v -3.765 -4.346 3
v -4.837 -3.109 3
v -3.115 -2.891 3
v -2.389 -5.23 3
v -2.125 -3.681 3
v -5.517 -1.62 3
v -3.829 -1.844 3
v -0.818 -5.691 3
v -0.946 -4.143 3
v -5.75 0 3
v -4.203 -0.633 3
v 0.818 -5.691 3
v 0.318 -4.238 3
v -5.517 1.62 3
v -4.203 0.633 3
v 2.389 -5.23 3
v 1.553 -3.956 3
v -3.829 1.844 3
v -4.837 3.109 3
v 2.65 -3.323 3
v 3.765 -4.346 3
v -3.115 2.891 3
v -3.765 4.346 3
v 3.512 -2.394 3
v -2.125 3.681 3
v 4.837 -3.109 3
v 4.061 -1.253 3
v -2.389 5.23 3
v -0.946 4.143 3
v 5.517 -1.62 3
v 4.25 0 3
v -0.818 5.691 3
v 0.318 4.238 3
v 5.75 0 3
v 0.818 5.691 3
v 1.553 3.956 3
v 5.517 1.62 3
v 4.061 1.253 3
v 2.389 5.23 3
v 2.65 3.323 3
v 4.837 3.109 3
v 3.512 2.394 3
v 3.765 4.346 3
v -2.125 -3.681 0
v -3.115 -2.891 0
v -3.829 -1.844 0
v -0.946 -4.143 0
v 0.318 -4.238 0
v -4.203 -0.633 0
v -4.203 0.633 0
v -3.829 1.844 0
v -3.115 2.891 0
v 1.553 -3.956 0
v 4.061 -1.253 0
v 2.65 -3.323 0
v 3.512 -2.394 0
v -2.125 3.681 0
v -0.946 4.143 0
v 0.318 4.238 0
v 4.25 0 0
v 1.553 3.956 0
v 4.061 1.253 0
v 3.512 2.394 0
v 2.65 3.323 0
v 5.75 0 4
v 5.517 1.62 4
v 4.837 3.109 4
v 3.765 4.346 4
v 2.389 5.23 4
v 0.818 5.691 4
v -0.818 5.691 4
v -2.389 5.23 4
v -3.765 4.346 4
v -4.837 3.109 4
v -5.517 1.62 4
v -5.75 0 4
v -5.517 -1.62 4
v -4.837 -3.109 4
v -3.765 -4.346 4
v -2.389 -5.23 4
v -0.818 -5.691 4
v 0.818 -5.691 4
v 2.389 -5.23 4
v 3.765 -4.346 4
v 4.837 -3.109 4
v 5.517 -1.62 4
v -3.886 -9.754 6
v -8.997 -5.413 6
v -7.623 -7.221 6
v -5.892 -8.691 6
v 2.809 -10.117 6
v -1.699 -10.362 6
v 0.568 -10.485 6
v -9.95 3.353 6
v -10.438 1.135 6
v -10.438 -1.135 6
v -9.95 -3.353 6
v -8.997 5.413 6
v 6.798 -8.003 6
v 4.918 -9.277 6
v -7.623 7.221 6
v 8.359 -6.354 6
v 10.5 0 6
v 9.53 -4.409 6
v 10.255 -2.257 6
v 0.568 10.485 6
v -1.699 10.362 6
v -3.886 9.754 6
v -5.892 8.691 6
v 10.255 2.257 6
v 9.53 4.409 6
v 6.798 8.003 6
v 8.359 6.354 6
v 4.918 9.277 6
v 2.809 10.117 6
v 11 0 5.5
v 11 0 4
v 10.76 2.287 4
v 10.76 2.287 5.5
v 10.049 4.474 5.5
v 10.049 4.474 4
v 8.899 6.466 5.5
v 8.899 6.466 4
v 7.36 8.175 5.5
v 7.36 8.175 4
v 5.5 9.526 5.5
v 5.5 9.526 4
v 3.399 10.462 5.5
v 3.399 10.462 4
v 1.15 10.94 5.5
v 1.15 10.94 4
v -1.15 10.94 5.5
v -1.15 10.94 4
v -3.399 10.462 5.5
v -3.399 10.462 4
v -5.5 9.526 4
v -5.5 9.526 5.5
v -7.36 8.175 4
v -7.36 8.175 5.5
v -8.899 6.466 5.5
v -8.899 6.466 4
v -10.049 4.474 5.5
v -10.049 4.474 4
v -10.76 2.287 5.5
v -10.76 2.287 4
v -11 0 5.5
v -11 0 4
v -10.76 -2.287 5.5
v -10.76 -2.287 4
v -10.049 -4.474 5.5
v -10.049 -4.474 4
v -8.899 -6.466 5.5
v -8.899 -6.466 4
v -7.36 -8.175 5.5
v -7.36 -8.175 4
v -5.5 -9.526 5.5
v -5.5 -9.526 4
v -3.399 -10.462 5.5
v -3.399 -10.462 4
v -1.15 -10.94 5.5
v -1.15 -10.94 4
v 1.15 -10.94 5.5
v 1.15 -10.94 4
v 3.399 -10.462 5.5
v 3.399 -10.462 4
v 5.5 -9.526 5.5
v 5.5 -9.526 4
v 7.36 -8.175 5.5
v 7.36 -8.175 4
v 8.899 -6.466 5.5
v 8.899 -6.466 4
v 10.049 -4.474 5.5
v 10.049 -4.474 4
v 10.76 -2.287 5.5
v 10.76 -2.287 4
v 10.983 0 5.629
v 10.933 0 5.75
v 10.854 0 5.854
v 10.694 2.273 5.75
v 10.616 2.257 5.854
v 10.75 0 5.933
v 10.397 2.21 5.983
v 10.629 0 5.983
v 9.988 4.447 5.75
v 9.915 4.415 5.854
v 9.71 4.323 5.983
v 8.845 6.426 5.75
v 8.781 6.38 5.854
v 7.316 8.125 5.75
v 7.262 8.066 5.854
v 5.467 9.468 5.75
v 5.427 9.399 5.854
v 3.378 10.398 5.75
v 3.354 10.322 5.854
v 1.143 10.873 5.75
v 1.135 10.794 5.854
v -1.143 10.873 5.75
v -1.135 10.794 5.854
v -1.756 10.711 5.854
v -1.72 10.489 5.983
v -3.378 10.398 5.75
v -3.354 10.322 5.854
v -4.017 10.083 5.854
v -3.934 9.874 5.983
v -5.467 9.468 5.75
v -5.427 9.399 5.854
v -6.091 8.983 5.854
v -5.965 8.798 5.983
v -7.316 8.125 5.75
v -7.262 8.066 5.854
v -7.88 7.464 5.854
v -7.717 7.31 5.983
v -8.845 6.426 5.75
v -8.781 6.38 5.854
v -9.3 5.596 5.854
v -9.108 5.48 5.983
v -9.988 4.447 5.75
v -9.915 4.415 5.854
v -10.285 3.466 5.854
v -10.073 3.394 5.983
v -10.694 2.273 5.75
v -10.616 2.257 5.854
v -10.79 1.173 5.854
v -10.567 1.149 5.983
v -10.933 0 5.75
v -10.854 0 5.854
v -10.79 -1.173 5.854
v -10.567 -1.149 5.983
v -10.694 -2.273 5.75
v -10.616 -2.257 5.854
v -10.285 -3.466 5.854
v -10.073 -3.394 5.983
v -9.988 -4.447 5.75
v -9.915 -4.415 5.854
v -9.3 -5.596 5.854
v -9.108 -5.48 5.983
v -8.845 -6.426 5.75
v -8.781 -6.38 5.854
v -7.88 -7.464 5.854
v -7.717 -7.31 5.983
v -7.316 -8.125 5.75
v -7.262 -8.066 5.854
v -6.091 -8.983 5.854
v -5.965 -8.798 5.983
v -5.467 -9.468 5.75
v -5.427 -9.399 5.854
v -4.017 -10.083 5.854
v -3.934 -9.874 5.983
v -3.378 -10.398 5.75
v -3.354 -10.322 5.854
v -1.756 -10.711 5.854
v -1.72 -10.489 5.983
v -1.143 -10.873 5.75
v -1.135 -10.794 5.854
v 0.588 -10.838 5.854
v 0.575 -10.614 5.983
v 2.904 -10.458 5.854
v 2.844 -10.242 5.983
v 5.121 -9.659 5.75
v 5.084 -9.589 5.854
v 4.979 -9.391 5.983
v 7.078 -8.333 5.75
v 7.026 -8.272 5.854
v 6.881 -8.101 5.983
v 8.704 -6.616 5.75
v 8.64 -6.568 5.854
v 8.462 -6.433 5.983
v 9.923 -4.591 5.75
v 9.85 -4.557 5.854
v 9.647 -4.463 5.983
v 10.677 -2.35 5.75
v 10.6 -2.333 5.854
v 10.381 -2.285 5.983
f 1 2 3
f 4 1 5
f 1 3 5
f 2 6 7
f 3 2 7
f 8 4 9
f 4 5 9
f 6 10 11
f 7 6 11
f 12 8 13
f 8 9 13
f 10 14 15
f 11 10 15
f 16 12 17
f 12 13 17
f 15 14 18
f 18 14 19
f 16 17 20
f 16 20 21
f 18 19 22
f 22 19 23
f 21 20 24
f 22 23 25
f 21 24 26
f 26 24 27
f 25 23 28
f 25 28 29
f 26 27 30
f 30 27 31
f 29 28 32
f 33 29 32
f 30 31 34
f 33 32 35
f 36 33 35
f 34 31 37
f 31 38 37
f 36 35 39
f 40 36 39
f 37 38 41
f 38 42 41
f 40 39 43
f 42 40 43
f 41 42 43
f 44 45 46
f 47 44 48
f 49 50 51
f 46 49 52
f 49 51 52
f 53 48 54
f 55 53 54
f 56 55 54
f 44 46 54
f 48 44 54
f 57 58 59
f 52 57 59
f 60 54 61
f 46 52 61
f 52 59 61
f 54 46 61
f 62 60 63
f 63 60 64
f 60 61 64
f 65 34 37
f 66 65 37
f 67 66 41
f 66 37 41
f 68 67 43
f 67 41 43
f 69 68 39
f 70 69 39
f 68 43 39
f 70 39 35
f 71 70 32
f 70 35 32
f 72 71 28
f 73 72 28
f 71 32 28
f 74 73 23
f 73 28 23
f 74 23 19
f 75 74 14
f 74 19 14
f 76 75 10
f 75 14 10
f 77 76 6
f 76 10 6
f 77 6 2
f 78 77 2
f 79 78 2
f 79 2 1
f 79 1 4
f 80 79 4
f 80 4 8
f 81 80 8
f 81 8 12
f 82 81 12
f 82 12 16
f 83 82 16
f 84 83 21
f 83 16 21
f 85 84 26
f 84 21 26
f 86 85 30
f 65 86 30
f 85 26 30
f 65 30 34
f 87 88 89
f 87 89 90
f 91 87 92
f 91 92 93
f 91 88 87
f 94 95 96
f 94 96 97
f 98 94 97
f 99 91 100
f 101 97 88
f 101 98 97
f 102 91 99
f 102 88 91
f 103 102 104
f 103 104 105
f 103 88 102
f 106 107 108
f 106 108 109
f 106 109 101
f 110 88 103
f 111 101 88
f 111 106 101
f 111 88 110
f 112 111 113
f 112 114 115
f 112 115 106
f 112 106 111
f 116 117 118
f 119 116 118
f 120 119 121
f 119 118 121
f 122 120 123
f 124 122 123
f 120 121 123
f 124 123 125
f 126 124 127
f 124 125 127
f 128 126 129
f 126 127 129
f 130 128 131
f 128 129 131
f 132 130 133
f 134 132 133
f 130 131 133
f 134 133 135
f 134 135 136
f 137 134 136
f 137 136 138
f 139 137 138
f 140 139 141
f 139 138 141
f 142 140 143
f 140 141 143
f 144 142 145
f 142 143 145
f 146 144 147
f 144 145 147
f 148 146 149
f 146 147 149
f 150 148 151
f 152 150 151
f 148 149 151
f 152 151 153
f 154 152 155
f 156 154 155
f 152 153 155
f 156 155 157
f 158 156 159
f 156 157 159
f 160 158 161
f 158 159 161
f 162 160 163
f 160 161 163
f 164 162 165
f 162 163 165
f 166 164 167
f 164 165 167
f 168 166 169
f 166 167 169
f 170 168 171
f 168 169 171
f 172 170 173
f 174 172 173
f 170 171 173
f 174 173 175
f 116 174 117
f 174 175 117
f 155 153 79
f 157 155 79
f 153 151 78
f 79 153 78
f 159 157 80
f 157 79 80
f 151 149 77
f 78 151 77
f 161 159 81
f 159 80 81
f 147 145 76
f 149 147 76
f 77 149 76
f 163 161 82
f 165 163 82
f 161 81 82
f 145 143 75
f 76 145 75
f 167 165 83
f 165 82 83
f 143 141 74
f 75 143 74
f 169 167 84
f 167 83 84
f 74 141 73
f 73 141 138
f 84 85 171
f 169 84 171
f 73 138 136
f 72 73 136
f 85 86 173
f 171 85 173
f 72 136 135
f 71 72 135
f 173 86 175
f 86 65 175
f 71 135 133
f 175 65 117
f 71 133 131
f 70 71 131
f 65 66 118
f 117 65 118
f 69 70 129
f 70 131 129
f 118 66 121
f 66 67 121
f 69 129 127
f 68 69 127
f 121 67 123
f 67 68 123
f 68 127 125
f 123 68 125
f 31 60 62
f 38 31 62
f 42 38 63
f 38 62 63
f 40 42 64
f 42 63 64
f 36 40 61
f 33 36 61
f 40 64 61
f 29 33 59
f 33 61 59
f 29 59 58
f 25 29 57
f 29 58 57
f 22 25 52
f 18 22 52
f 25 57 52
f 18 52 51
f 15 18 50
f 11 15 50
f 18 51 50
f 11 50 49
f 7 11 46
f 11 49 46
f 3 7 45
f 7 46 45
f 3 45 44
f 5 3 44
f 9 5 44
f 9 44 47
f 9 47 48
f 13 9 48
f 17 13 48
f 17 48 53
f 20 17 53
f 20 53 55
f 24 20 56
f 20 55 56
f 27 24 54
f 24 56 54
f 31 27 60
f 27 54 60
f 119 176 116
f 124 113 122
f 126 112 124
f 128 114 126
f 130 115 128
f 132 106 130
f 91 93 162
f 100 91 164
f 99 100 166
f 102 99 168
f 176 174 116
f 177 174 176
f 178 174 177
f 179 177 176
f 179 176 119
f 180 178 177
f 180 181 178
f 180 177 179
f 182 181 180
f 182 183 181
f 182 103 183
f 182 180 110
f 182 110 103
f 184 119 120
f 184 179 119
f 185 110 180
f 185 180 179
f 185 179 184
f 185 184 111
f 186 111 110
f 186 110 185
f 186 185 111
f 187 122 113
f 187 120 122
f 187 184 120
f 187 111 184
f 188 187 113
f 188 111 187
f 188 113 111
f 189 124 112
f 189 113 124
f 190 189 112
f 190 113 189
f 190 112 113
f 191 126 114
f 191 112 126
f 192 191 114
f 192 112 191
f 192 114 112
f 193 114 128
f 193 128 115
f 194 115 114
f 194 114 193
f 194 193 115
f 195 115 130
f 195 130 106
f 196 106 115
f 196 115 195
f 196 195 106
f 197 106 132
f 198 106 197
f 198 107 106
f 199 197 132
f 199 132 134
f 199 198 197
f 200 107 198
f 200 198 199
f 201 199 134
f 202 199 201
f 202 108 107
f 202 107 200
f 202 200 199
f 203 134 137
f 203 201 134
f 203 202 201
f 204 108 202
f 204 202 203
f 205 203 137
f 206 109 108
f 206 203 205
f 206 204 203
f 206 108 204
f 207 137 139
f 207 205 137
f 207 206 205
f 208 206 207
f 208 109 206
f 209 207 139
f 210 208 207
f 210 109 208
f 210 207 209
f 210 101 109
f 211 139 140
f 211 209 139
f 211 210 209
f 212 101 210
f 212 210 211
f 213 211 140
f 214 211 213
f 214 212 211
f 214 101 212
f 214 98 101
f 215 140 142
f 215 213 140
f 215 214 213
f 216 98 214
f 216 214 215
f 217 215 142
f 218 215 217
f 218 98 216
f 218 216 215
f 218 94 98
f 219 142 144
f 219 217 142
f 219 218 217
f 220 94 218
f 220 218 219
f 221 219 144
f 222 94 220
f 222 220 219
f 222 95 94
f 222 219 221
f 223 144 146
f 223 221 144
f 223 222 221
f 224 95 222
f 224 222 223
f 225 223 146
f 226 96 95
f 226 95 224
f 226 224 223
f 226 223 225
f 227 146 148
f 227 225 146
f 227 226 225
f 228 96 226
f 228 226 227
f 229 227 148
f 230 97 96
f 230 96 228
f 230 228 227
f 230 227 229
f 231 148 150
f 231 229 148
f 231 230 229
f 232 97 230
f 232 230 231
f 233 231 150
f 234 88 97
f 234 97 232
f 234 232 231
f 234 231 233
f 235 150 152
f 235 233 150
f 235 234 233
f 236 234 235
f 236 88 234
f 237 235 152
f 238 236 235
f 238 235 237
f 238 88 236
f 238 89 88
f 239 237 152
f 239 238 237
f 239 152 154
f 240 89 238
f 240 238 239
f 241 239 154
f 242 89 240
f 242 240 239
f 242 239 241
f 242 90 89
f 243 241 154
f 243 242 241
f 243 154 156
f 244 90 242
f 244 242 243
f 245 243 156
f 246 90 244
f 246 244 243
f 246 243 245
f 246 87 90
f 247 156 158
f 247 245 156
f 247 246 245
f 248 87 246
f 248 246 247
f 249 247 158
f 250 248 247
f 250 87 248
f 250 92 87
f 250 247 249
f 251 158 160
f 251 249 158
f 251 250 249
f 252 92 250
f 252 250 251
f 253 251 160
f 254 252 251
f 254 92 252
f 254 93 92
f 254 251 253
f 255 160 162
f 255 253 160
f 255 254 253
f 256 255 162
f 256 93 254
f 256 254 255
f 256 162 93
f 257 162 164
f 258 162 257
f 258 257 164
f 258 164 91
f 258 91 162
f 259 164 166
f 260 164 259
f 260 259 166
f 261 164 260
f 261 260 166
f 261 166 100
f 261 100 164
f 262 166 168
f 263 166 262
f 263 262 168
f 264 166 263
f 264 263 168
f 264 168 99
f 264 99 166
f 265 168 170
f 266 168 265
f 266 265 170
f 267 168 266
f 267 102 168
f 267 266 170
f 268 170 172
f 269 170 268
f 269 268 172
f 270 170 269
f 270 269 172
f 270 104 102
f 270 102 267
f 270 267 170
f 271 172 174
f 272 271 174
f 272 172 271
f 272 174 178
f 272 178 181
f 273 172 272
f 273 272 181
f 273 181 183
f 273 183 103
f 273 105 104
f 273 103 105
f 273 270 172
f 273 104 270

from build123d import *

# Parameters (mm, degrees)
F0_R     = 4.25
F1_DEPTH = 3
F2_R     = 5.75
F3_DEPTH = 1
F4_R     = 11
F5_DEPTH = 2
F6_R     = 0.5


with BuildPart() as f1:
    # F0 (on Top) → F1 (new body)
    with BuildSketch(Plane.XY):
        Circle(F0_R)
    extrude(amount=F1_DEPTH)

    # F2 (on face) → F3 (join)
    with BuildSketch(Plane.XY.offset(3)):
        Circle(F2_R)
    extrude(amount=F3_DEPTH)

    # F4 (on face) → F5 (join)
    with BuildSketch(Plane.XY.offset(4)):
        Circle(F4_R)
    extrude(amount=F5_DEPTH)

    # F6
    f6_edges = [f1.edges().sort_by_distance(p)[0] for p in [
        (-11, 0, 6),
    ]]
    fillet(f6_edges, radius=F6_R)


solid = f1.part
